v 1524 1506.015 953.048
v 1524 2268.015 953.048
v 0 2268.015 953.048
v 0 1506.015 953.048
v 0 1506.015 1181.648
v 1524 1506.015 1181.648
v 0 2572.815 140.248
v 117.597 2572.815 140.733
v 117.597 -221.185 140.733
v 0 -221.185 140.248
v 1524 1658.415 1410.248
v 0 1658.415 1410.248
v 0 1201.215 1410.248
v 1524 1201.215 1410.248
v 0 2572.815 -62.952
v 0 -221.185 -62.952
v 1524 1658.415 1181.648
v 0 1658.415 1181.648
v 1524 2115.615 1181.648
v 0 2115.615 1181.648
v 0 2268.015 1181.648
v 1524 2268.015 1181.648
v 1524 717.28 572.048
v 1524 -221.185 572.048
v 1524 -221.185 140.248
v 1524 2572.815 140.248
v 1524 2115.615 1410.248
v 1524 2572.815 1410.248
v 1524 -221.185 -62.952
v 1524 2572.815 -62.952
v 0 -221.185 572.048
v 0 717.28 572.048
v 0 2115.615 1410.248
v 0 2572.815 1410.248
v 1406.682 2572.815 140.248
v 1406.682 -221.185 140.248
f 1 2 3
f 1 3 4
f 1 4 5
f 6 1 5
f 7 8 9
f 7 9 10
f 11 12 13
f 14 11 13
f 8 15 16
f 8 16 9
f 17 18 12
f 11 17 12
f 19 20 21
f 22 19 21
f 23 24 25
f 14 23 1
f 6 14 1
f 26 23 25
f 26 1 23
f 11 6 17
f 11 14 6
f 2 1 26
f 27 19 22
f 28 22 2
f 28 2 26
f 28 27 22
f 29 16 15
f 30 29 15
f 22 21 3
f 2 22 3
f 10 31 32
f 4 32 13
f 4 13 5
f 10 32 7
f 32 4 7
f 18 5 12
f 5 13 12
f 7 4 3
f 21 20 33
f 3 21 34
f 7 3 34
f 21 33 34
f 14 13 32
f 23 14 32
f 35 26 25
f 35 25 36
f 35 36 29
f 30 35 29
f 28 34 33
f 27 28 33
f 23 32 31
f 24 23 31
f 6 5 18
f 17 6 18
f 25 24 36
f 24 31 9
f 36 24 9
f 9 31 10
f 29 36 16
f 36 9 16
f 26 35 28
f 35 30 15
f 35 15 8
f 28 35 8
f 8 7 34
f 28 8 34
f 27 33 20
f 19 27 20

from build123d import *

# Parameters (mm, degrees)
F1_DEPTH = 1524
F0_W     = 2794
F0_H     = 203.2
F2_DEPTH = 1524
F4_DEPTH = 2794.001


with BuildPart() as f1:
    # F0 (on Right) → F1 (new body)
    with BuildSketch(Plane.YZ):
        Polygon((-221.185034, 572.048152), (-221.185034, 140.248152), (2572.814966, 140.248152), (2572.814966, 953.048152), (2572.814966, 1181.648152), (2572.814966, 1410.248152), (2115.614966, 1410.248152), (2115.614966, 1181.648152), (2268.014966, 1181.648152), (2268.014966, 953.048152), (1506.014966, 953.048152), (1506.014966, 1181.648152), (1658.414966, 1181.648152), (1658.414966, 1410.248152), (1201.214966, 1410.248152), (717.279971, 572.048152), align=None)
    extrude(amount=F1_DEPTH)

    # F0 (on Right) → F2 (join)
    with BuildSketch(Plane.YZ):
        with Locations((1175.814966, 38.648152)):
            Rectangle(F0_W, F0_H)
        Polygon((-221.185034, 572.048152), (-221.185034, 140.248152), (2572.814966, 140.248152), (2572.814966, 953.048152), (2572.814966, 1181.648152), (2572.814966, 1410.248152), (2115.614966, 1410.248152), (2115.614966, 1181.648152), (2268.014966, 1181.648152), (2268.014966, 953.048152), (1506.014966, 953.048152), (1506.014966, 1181.648152), (1658.414966, 1181.648152), (1658.414966, 1410.248152), (1201.214966, 1410.248152), (717.279971, 572.048152), align=None)
    extrude(amount=F2_DEPTH)

    # F3 (on face) → F4 (cut, through all)
    with BuildSketch(Plane.XZ.offset(221.185034)):
        Polygon((0, 140.248152), (0, -62.951848), (117.59745, 140.73291), align=None)
        Polygon((1406.682425, 140.248152), (1524, -62.951848), (1524, 140.248152), align=None)
    extrude(amount=-F4_DEPTH, mode=Mode.SUBTRACT)


solid = f1.part
